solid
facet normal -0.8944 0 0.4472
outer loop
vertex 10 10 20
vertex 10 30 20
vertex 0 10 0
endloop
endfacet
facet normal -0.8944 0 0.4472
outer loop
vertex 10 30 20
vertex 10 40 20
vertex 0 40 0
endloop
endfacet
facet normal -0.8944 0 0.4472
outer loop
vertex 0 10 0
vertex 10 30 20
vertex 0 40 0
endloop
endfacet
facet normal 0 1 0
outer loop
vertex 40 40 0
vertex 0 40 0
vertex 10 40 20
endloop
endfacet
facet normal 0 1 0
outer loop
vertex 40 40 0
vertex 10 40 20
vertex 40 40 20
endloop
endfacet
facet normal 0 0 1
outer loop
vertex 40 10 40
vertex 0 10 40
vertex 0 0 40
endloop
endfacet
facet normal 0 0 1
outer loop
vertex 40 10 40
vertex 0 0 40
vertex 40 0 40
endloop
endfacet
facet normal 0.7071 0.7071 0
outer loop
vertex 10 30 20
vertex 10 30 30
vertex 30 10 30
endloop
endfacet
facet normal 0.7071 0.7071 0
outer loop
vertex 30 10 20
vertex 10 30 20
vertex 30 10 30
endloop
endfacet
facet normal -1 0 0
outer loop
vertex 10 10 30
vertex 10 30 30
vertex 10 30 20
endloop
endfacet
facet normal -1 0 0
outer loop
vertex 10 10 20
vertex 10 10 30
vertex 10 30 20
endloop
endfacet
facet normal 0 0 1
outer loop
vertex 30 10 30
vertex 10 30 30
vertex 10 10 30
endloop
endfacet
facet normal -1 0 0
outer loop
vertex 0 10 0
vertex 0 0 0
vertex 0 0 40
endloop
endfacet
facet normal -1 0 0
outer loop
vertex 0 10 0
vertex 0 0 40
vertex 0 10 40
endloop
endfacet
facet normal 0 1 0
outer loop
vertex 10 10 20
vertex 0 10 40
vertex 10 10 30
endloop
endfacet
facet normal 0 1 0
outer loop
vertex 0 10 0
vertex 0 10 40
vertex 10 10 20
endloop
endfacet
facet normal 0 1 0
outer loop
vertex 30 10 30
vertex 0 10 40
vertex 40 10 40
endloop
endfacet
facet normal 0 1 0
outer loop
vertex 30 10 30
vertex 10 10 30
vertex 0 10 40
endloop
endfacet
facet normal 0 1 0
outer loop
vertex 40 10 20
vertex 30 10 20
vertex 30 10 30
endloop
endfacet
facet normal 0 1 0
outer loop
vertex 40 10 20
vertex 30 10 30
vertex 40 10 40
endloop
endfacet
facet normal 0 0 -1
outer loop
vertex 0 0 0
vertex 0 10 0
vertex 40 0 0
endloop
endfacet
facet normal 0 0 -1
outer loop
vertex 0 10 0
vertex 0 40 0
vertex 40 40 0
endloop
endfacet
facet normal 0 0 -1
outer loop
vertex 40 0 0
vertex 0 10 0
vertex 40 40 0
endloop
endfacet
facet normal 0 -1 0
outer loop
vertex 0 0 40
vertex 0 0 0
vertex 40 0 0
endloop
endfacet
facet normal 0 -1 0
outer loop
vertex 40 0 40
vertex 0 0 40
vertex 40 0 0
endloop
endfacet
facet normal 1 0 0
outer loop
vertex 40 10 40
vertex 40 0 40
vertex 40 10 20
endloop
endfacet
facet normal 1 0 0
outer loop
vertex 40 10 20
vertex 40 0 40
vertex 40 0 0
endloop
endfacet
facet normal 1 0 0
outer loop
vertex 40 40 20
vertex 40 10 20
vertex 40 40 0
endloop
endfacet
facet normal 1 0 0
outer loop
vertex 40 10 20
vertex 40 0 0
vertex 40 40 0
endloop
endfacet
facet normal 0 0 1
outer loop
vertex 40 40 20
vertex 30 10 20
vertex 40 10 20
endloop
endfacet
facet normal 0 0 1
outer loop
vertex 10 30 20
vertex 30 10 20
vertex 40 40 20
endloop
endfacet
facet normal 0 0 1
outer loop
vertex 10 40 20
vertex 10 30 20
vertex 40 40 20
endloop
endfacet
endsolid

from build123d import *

# Parameters (mm, degrees)
SKETCH1_W           = 40
SKETCH1_H           = 40
BOSS_EXTRUDE1_DEPTH = 40
SKETCH2_W           = 10
SKETCH2_H           = 10
CUT_EXTRUDE1_DEPTH  = 40
SKETCH3_W           = 10
SKETCH3_H           = 10
CUT_EXTRUDE2_DEPTH  = 20
SKETCH5_W           = 10
SKETCH5_H           = 10
CUT_EXTRUDE3_DEPTH  = 20
CUT_EXTRUDE5_DEPTH  = 30
CUT_EXTRUDE6_DEPTH  = 10


with BuildPart() as part:
    # Sketch1 → Boss-Extrude1 (new body)
    with BuildSketch(Plane.XY):
        with Locations((20, 20)):
            Rectangle(SKETCH1_W, SKETCH1_H)
    extrude(amount=BOSS_EXTRUDE1_DEPTH)

    # Sketch2 → Cut-Extrude1 (cut)
    with BuildSketch(Plane.ZY):
        with Locations((25, 35)):
            Rectangle(SKETCH2_W, SKETCH2_H)
        Polygon((40, 10), (40, 40), (30, 40), (30, 30), (30, 10), align=None)
    extrude(amount=-CUT_EXTRUDE1_DEPTH, mode=Mode.SUBTRACT)

    # Sketch3 → Cut-Extrude2 (cut)
    with BuildSketch(Plane(origin=(0, 30, 0), x_dir=(1, 0, 0), z_dir=(0, 1, 0))):
        with Locations((35, -25)):
            Rectangle(SKETCH3_W, SKETCH3_H)
    extrude(amount=-CUT_EXTRUDE2_DEPTH, mode=Mode.SUBTRACT)

    # Sketch5 → Cut-Extrude3 (cut)
    with BuildSketch(Plane(origin=(0, 30, 0), x_dir=(1, 0, 0), z_dir=(0, 1, 0))):
        with Locations((5, -25)):
            Rectangle(SKETCH5_W, SKETCH5_H)
    extrude(amount=-CUT_EXTRUDE3_DEPTH, mode=Mode.SUBTRACT)

    # Sketch6 → Cut-Extrude5 (cut)
    with BuildSketch(Plane(origin=(0, 40, 0), x_dir=(1, 0, 0), z_dir=(0, 1, 0))):
        Polygon((10, -20), (0, 0), (0, -20), align=None)
    extrude(amount=-CUT_EXTRUDE5_DEPTH, mode=Mode.SUBTRACT)

    # Sketch7 → Cut-Extrude6 (cut)
    with BuildSketch(Plane.XY.offset(30)):
        Polygon((10, 30), (30, 10), (30, 30), align=None)
    extrude(amount=-CUT_EXTRUDE6_DEPTH, mode=Mode.SUBTRACT)


solid = part.part
